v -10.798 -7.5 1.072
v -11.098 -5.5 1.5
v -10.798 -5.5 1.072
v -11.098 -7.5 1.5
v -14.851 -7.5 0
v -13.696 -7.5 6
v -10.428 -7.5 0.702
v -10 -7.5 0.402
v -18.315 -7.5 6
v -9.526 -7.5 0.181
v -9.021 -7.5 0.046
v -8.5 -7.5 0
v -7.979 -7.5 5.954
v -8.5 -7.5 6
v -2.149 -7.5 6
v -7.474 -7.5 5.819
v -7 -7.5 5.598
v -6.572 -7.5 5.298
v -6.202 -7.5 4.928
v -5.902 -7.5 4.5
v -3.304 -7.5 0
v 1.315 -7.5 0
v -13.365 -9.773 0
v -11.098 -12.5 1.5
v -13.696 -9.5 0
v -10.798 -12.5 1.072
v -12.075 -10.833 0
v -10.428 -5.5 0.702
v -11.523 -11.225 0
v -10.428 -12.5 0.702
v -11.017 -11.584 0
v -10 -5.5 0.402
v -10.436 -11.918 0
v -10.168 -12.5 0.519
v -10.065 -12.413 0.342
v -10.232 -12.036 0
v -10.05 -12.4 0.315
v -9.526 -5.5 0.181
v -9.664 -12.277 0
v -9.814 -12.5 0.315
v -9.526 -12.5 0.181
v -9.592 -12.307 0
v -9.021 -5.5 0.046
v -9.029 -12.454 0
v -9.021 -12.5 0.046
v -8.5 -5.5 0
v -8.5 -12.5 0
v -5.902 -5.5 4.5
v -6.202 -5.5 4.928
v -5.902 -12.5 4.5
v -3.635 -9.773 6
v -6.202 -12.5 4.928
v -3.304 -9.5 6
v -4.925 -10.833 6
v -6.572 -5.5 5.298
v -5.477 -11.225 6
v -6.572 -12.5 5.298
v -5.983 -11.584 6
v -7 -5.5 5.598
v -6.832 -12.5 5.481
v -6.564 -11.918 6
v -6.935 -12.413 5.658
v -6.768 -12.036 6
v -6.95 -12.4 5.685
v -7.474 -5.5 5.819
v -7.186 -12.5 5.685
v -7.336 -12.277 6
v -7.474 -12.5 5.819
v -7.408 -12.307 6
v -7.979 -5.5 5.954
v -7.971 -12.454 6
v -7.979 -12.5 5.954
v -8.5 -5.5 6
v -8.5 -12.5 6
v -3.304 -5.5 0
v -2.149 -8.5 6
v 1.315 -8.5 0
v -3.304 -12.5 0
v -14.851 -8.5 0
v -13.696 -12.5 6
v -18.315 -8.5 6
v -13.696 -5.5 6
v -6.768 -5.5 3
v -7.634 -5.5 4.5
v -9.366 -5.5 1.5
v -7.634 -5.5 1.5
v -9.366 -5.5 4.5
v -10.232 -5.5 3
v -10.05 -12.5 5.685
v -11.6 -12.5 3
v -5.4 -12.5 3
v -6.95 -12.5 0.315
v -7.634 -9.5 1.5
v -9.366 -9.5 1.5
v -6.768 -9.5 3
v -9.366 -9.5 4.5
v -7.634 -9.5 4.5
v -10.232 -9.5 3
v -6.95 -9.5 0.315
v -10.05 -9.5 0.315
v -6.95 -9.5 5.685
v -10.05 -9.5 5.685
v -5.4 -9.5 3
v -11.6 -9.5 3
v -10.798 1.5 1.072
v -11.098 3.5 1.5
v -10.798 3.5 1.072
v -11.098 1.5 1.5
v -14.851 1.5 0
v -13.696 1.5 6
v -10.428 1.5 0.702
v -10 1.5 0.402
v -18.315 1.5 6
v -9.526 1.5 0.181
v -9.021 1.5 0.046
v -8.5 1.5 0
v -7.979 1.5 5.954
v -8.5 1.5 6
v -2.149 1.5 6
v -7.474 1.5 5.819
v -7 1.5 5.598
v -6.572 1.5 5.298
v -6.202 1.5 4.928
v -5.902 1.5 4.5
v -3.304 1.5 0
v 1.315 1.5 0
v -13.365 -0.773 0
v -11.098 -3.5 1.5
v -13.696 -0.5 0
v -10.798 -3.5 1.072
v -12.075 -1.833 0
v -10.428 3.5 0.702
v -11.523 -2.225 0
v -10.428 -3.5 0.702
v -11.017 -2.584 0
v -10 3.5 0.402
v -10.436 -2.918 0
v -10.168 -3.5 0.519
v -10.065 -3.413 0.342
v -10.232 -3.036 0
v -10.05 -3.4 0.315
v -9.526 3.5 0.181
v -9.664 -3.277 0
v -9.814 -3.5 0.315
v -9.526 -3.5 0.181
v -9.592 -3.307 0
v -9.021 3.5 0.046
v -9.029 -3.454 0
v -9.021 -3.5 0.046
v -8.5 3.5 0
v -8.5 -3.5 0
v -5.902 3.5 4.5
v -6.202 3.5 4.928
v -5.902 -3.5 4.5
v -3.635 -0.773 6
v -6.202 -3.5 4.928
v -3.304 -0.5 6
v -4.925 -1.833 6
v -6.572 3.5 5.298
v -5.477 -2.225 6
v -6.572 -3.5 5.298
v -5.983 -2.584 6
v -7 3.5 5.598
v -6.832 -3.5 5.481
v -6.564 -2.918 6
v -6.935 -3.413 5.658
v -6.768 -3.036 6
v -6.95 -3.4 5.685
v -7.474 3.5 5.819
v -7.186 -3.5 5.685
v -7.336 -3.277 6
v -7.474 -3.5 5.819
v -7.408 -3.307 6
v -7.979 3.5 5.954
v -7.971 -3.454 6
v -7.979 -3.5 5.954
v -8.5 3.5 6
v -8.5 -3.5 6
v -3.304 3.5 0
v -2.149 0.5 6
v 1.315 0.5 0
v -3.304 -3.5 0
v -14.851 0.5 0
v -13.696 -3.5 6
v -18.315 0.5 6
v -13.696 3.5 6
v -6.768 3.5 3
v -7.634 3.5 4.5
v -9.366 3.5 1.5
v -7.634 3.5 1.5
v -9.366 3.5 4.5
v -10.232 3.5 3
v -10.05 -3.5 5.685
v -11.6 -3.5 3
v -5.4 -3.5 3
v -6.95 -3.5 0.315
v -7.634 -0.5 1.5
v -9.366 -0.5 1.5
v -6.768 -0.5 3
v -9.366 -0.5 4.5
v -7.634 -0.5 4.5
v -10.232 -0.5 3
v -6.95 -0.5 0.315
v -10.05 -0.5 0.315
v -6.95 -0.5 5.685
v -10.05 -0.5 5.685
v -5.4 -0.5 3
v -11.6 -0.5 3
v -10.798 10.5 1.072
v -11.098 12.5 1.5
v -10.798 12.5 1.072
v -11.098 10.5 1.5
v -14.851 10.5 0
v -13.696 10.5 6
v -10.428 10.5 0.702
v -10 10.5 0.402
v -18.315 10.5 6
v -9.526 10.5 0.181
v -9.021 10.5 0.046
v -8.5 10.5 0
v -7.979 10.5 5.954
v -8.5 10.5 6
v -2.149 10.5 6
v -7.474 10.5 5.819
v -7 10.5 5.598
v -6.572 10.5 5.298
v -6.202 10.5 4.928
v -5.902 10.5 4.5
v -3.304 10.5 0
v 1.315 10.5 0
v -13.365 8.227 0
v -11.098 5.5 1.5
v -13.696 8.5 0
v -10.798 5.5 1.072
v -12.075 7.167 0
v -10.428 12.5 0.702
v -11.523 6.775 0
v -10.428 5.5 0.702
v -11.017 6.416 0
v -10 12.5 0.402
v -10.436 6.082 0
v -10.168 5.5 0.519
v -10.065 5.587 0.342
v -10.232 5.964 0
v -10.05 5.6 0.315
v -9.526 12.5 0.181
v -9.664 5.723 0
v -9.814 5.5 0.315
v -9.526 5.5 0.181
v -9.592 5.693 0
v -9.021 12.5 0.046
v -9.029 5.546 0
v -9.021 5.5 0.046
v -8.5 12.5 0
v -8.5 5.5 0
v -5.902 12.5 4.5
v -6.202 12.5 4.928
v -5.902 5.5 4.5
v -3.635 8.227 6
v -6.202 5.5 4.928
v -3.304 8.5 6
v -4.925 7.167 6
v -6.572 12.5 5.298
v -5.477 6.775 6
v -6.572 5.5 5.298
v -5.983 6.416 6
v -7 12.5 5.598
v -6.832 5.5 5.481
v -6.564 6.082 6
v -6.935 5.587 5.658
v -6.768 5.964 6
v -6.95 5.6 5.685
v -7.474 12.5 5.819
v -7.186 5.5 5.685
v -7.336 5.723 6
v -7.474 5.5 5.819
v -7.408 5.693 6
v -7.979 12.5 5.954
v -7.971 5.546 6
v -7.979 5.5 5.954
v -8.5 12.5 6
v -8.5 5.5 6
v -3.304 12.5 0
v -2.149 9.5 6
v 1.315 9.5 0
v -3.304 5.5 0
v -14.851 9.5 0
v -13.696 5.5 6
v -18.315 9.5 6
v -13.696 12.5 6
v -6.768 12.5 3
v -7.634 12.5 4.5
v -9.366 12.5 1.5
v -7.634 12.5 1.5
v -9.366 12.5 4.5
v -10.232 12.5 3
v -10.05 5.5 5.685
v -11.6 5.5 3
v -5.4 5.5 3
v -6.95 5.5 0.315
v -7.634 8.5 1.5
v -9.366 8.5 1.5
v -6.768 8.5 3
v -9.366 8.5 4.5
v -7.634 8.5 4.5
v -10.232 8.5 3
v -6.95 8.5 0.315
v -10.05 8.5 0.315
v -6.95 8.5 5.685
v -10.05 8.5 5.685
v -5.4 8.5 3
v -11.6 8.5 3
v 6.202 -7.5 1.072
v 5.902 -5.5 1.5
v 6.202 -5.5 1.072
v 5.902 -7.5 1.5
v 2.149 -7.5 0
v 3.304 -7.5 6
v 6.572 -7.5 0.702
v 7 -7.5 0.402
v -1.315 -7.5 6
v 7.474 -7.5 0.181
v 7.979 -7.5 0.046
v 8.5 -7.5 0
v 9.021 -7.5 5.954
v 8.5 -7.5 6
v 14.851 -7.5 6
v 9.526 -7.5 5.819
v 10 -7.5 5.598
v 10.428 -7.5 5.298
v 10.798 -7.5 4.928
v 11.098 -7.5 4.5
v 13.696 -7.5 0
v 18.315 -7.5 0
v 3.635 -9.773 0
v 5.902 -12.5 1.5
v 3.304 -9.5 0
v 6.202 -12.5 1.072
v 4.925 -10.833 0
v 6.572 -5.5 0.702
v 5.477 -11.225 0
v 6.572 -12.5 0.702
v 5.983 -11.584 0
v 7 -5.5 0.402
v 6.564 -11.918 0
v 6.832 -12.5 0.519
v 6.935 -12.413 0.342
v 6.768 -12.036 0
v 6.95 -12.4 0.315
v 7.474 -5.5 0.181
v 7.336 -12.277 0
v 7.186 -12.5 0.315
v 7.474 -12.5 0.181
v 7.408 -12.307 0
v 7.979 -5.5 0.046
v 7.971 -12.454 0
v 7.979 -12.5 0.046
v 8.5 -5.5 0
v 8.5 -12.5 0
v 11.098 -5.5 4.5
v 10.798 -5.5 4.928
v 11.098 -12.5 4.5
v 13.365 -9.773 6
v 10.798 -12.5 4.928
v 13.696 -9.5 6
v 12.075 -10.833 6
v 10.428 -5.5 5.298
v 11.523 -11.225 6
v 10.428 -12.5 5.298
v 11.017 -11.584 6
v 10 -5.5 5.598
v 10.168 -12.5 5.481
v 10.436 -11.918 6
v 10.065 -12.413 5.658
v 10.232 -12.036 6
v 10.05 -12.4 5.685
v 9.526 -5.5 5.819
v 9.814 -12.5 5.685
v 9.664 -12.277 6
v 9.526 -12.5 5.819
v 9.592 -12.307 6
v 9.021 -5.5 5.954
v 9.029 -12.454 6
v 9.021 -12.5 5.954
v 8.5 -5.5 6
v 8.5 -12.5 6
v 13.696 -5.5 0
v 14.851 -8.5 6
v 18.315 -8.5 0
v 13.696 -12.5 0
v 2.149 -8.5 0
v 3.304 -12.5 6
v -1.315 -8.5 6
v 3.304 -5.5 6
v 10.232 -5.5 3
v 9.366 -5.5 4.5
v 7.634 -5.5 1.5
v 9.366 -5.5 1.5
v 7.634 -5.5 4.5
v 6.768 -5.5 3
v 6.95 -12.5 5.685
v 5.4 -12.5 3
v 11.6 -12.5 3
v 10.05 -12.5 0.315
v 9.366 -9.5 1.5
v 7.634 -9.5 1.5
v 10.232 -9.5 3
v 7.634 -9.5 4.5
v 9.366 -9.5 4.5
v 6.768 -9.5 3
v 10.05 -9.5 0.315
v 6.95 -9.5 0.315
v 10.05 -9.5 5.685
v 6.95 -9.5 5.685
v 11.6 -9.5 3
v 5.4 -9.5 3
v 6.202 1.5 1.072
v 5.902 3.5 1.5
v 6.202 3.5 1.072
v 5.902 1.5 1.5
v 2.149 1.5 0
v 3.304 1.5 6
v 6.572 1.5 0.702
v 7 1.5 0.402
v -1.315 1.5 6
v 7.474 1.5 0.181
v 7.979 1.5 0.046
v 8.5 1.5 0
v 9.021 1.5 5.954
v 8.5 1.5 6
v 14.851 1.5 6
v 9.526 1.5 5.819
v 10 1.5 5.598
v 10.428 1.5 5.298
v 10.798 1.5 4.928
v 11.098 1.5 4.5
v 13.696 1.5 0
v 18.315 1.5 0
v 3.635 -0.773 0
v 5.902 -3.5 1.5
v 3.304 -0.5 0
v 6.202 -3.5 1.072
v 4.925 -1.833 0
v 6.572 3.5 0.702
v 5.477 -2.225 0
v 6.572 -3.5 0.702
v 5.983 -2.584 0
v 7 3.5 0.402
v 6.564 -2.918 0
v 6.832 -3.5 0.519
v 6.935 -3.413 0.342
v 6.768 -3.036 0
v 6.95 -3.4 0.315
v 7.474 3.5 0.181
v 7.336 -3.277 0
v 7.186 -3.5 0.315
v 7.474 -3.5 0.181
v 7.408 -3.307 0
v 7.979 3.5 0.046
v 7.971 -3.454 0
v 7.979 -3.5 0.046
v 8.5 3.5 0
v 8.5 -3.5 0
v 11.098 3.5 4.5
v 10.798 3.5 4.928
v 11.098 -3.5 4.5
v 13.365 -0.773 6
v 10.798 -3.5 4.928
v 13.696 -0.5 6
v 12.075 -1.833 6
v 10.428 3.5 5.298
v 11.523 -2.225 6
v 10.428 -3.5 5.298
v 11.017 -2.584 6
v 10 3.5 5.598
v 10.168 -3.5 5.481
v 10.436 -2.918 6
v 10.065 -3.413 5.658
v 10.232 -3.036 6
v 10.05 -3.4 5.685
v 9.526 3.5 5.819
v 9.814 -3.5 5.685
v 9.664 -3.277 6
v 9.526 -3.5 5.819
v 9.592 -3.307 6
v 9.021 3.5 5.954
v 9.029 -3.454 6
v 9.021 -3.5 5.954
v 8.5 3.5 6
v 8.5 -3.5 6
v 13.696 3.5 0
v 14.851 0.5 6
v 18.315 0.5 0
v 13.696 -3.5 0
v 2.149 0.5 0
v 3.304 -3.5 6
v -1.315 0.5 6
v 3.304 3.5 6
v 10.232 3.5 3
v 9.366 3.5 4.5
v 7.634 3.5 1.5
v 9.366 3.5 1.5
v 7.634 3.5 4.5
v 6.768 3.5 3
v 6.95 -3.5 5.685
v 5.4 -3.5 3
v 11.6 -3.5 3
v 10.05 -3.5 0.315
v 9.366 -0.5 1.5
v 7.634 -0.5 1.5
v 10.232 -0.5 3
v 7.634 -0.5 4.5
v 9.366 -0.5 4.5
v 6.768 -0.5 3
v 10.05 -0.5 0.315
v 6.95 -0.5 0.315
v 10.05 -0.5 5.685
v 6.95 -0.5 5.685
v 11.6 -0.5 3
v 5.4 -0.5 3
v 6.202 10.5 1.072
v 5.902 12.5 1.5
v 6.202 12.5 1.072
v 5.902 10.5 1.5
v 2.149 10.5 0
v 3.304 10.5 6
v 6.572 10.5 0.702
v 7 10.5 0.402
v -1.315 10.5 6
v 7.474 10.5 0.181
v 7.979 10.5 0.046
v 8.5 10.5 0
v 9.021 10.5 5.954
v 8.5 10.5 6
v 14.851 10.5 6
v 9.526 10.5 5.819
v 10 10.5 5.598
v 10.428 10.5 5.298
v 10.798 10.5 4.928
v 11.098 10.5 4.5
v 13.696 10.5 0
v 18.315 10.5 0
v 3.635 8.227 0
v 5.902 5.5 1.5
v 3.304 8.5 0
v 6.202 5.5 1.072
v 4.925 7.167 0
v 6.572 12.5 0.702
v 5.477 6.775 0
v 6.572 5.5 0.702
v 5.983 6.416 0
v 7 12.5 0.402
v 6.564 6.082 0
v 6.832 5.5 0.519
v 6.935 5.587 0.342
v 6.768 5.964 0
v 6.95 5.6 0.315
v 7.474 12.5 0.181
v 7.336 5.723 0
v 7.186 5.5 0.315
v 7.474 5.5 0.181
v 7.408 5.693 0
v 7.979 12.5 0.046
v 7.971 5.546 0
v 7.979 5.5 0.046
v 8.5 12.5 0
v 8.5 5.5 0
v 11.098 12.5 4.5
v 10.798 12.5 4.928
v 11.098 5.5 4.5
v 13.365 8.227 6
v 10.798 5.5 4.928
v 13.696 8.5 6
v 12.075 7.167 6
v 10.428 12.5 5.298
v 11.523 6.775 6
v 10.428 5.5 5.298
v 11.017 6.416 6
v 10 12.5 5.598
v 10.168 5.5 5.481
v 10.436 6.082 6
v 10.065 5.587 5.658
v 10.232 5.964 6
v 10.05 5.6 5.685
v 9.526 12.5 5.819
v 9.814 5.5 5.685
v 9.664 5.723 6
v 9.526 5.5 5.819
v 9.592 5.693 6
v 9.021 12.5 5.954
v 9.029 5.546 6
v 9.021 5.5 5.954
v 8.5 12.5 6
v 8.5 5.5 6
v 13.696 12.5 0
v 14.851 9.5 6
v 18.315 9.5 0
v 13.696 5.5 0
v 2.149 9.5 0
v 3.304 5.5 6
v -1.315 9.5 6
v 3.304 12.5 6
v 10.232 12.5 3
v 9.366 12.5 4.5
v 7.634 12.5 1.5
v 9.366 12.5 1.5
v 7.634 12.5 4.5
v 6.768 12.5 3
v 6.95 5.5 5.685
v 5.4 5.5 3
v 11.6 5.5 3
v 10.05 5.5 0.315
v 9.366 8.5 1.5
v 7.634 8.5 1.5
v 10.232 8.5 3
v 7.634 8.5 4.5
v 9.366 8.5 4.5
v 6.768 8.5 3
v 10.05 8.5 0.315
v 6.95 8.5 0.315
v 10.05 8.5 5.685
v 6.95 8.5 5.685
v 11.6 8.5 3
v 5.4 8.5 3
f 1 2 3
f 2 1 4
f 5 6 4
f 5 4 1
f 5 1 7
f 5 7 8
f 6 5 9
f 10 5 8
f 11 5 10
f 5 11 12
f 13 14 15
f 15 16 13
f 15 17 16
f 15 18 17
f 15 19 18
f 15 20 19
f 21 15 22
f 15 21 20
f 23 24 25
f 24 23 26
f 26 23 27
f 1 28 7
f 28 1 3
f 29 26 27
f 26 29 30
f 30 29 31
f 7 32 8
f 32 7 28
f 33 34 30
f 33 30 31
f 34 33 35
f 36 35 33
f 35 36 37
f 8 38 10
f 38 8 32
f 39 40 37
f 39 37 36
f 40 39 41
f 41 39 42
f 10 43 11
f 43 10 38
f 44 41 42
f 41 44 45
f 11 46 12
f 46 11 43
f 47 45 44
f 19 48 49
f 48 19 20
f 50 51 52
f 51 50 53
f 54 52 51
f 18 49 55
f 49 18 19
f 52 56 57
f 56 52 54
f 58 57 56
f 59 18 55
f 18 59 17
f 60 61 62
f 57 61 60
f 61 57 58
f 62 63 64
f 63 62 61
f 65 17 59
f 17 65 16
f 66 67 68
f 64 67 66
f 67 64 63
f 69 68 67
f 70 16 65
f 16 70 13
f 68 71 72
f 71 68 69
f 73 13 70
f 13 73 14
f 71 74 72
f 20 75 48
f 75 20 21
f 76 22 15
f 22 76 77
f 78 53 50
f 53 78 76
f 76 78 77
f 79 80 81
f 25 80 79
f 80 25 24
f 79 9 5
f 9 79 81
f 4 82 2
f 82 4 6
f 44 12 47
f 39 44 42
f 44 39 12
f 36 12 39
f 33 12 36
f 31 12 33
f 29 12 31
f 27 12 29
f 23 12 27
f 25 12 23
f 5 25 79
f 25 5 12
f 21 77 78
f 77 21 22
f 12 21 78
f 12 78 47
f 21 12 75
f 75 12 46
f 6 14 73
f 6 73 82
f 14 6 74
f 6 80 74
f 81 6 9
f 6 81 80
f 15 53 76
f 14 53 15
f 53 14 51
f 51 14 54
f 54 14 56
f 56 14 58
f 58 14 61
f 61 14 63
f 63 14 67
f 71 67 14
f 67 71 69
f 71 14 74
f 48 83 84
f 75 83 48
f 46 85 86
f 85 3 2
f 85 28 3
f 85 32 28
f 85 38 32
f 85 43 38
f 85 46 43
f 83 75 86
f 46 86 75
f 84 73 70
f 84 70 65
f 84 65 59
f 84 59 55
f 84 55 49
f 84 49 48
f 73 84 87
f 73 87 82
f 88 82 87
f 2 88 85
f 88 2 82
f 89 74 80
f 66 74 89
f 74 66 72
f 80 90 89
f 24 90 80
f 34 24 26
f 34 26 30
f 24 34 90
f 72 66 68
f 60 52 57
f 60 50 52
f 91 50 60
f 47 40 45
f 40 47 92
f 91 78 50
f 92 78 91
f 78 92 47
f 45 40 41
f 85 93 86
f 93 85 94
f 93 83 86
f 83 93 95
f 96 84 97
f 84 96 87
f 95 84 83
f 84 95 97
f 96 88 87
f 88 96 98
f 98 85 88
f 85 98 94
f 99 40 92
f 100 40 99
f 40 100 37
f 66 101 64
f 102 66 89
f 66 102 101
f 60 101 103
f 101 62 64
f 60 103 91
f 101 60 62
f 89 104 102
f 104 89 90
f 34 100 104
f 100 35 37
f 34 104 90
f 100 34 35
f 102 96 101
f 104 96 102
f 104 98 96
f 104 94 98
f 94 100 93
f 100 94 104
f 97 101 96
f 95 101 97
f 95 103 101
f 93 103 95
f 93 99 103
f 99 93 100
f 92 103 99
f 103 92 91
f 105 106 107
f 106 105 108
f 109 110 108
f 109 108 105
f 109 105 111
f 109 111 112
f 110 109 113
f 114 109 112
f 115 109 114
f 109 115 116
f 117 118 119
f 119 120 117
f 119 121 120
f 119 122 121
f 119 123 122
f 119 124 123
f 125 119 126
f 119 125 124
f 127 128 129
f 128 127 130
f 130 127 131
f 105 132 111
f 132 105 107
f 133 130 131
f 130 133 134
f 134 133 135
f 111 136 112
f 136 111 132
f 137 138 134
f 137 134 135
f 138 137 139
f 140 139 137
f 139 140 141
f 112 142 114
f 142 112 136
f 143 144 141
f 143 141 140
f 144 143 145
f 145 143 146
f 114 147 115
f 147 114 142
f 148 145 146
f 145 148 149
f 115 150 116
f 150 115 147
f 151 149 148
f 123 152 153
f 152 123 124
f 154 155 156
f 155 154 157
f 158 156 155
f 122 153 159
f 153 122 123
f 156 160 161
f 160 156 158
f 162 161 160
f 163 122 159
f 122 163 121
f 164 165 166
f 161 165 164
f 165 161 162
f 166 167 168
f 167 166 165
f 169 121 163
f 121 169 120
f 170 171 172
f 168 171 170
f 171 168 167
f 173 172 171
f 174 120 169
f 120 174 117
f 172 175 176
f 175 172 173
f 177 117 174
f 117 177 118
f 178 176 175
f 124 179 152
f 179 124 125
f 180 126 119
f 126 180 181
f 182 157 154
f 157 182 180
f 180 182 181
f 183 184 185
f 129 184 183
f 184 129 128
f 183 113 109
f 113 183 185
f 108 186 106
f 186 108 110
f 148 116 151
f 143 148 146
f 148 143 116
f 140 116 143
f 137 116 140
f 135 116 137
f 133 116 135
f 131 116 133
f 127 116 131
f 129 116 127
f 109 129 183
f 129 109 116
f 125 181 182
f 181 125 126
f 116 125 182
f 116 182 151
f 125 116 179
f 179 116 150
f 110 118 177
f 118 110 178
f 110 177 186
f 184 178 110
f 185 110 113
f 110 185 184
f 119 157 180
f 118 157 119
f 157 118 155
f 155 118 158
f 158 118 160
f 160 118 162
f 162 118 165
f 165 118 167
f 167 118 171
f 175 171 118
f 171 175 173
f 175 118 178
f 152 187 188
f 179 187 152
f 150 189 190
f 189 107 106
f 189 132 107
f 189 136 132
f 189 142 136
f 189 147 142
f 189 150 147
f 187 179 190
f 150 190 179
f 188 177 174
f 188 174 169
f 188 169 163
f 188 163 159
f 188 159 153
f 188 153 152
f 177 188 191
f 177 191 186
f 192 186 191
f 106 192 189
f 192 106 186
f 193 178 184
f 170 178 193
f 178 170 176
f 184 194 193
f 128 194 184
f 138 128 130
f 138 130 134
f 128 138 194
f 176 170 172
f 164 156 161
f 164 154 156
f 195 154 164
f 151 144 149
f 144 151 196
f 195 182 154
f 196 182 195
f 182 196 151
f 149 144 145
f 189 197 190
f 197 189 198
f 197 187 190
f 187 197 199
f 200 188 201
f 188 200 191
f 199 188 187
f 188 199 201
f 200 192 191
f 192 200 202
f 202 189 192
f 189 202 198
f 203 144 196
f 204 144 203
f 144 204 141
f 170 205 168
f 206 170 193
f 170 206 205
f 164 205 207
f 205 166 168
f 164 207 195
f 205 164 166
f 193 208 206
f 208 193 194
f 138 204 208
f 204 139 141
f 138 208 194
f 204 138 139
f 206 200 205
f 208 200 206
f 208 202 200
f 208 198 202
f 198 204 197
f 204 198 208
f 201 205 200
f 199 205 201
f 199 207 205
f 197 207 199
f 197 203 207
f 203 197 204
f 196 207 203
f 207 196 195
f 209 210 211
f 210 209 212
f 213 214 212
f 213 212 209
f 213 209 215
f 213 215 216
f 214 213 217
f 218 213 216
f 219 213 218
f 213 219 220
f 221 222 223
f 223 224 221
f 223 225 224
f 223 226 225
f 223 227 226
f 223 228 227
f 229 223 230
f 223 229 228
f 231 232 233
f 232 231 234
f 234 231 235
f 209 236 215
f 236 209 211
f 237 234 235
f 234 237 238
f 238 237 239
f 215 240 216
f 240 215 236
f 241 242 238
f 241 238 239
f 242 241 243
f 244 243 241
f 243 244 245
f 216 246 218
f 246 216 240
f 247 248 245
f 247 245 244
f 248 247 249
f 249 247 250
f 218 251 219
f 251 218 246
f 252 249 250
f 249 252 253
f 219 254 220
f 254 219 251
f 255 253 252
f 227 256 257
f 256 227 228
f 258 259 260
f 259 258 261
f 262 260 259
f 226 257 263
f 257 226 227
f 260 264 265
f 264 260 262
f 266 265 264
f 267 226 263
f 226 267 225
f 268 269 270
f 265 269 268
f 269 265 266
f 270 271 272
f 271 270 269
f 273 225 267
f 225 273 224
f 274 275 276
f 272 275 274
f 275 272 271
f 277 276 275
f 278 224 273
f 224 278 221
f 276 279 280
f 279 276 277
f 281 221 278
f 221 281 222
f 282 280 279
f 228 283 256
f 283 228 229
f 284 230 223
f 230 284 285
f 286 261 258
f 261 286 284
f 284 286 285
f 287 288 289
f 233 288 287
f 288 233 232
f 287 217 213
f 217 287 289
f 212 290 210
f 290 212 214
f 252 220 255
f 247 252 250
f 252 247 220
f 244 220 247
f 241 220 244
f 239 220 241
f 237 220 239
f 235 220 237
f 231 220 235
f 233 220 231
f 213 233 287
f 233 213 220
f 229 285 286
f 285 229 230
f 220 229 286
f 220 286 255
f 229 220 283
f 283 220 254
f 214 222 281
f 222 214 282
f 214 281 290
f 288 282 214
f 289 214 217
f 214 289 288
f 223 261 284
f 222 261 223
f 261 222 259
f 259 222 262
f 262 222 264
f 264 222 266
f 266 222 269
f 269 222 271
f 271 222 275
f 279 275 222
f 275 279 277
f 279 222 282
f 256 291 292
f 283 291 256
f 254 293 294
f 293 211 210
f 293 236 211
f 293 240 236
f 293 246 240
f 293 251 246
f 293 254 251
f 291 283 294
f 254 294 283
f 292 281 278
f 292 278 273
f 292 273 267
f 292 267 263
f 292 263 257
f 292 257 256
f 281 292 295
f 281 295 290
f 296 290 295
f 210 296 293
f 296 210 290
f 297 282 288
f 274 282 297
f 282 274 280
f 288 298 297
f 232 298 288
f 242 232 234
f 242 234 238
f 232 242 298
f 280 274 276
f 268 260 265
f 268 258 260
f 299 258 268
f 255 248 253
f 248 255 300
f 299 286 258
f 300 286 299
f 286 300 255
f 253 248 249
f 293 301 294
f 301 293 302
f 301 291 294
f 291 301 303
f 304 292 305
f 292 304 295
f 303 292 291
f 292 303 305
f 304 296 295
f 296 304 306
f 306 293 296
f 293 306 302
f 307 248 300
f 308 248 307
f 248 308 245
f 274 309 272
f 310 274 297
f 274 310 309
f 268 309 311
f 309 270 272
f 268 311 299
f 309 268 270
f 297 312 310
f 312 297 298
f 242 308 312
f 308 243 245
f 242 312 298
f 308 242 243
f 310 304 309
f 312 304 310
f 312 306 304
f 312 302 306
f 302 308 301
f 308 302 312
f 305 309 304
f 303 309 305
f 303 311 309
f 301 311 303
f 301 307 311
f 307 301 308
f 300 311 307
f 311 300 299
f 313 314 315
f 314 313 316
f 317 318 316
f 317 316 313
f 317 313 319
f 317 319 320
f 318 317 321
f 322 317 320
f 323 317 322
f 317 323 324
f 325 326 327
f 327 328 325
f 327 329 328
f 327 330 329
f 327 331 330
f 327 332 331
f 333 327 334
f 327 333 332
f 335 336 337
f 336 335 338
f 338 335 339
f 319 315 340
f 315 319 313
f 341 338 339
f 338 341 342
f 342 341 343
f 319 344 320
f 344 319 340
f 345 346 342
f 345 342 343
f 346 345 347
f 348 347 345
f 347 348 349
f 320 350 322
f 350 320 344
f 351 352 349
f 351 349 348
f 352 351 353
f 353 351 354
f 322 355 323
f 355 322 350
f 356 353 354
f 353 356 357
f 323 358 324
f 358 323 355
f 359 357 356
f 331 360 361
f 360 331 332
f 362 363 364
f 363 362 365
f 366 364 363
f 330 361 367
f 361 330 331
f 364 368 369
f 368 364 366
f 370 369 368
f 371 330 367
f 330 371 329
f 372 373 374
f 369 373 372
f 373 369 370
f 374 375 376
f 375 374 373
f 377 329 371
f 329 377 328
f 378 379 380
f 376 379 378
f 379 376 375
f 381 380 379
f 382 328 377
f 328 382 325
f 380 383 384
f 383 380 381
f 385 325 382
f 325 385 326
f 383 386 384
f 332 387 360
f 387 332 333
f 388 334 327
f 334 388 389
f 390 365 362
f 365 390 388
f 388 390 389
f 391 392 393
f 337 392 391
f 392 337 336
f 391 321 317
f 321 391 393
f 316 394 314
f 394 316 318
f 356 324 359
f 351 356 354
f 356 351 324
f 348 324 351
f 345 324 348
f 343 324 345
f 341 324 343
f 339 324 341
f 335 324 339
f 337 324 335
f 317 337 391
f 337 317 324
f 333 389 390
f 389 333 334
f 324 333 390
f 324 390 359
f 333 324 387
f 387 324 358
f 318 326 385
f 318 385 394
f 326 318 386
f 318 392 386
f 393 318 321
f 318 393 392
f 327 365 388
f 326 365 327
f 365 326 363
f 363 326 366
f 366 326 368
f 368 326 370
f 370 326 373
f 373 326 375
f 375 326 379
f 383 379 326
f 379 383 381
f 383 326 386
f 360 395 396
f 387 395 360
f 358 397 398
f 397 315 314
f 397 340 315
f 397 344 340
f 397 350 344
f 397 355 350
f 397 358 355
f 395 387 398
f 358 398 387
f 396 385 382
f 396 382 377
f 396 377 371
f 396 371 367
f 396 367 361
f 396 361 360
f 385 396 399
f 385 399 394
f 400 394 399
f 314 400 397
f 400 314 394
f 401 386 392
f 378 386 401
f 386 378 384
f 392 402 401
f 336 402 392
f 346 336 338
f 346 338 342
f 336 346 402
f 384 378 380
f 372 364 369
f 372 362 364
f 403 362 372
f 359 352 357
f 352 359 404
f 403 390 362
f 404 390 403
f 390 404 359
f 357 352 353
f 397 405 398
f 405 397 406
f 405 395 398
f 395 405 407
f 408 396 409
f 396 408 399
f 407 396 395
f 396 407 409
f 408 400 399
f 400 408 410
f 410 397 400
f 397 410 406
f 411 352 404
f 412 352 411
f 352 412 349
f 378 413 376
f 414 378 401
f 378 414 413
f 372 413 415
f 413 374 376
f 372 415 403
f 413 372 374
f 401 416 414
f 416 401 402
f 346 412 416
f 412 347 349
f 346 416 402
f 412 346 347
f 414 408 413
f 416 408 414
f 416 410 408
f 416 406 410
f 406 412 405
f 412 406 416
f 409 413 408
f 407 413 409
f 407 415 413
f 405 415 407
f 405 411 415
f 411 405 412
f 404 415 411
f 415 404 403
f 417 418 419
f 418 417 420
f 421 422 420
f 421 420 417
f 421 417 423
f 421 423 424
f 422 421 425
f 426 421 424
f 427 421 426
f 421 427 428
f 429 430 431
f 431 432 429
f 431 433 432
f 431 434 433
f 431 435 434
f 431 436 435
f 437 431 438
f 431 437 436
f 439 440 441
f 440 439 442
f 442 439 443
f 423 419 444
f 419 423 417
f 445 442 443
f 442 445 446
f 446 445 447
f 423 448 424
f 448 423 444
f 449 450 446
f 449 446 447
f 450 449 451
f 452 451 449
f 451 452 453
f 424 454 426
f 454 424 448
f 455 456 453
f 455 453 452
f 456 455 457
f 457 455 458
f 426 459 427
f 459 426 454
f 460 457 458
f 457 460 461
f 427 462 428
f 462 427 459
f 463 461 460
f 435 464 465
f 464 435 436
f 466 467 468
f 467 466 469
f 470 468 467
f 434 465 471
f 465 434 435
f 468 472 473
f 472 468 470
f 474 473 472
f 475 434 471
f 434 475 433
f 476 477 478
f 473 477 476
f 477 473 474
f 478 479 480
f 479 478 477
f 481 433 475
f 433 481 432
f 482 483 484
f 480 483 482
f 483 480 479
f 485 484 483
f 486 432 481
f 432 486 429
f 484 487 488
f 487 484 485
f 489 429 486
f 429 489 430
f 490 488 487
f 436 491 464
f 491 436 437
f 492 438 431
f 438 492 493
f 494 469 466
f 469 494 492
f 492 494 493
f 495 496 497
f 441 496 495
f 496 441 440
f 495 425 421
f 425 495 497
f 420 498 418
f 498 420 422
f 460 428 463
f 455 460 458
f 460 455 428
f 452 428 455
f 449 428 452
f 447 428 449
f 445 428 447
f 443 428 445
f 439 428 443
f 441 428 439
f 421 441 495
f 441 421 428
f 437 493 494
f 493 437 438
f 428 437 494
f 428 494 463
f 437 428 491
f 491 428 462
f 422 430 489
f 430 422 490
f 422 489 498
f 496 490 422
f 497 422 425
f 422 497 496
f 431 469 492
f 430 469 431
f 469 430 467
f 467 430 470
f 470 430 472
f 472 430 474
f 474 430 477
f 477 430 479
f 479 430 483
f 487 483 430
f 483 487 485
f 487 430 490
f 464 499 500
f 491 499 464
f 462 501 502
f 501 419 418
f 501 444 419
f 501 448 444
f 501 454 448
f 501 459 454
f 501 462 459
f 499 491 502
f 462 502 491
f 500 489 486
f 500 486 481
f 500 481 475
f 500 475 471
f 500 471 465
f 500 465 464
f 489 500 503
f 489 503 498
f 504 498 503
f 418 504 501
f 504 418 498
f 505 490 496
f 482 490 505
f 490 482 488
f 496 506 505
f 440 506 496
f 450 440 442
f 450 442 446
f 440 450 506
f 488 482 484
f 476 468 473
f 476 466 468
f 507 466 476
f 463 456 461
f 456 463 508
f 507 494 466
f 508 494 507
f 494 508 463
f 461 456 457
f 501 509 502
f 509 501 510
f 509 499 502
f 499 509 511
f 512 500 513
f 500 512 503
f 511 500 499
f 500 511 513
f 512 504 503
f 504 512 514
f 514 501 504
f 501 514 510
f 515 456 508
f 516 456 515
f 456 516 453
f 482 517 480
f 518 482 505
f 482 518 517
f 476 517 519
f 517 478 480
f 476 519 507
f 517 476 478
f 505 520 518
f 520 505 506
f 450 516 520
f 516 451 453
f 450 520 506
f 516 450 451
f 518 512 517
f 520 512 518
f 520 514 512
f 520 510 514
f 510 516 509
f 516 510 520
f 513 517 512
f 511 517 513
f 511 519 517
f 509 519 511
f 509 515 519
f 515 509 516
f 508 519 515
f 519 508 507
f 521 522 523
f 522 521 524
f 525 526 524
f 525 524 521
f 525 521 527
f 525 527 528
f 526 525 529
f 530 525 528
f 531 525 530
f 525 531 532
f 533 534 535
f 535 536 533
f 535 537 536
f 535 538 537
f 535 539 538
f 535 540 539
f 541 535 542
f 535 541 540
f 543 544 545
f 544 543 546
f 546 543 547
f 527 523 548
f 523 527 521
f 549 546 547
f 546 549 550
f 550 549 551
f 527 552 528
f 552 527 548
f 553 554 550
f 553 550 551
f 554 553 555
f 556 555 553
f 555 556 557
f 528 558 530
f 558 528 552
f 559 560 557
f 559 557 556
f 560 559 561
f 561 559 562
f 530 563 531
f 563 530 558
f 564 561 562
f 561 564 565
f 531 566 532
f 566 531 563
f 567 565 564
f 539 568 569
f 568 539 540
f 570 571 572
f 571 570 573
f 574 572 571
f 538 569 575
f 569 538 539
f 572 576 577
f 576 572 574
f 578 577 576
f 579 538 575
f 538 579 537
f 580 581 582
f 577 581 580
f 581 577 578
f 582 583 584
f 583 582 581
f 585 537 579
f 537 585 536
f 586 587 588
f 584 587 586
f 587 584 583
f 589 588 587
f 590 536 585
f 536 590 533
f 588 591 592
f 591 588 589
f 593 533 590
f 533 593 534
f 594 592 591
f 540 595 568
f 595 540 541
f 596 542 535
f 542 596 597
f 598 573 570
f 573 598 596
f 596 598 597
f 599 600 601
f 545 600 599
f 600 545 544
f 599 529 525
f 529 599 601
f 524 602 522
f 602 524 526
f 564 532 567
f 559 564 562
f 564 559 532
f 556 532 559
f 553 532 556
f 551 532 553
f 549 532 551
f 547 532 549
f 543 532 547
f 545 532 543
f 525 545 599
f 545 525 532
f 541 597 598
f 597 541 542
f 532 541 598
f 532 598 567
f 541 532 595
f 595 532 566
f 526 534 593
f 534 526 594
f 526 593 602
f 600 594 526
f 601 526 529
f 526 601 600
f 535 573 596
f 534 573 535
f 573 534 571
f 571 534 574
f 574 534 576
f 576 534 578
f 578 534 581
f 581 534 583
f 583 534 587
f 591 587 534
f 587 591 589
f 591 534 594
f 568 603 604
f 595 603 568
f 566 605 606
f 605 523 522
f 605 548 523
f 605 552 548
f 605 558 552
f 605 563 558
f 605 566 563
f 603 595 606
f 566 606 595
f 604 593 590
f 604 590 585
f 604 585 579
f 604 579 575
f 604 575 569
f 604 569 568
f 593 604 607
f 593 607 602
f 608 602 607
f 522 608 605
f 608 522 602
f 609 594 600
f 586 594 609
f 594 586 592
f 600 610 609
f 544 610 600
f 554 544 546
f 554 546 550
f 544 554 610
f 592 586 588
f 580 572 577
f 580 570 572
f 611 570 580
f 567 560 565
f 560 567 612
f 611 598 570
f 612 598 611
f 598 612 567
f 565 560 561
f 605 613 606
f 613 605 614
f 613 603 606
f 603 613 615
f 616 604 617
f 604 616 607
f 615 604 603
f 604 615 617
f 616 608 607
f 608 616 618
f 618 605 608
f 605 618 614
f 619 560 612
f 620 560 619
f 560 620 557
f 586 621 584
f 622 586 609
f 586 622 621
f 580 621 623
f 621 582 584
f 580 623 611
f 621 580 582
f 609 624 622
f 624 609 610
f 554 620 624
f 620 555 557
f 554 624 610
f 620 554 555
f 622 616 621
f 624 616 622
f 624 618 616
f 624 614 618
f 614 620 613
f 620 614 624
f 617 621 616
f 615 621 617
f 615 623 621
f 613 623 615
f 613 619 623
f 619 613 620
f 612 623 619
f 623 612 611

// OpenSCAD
width = 14; //11 for 20mm, 14 for 25mm
slot_width = 6;
depth = 7; //5.5 for 20mm, 7 for 25mm
slot_depth = 2;
screw_size = 3;
nut_size = 6.2;
nut_depth = 3;

repeat_x = 2;
repeat_y = 3;

// ratio for converting diameter to apothem
da6 = 1 / cos(180 / 6) / 2;
da8 = 1 / cos(180 / 8) / 2;
da12 = 1 / cos(180 / 12) / 2;

%square(100, center = true);
for(x = [-(repeat_x - 1) / 2:(repeat_x - 1) / 2]) for(y = [-(repeat_y - 1) / 2:(repeat_y - 1) / 2]) translate([x * (width + 3), y * (depth + 2), slot_width / 2]) render() 
difference() {
	linear_extrude(height = slot_width, center = true, convexity = 5) difference() {
		square([width * 1.5, depth], center = true);
	}
	rotate([0, -30, 0]) {
		linear_extrude(height = slot_width * 5, center = true, convexity = 5) difference() {
			for(side = [0, 1]) mirror([side, 0, 0]) cut();
		}
		rotate([-90, 0, 0]) difference() {
			rotate(90) rotate_extrude(convexity = 5, $fn = 36) cut();
			for(side = [0, 1]) for(a = [0, 1]) rotate(side * 180 + a * 30) translate([0, 0, -50]) cube(100);
		}
	}
	rotate([90, 0, 0]) cylinder(r = screw_size * da6, h = 100, center = true, $fn = 6);
	rotate([90, 0, 0]) translate([0, 0, depth / 2 - nut_depth]) cylinder(r = nut_size / 2, h = 100, $fn = 6);
}

module cut() {
	translate([width, -1]) square([width, depth + 2], center = true);
	translate([slot_width / 2, depth / 2 - slot_depth]) square([width, depth]);
	translate([slot_width / 2, -depth / 2]) rotate(-45) square([width, depth]);
}
